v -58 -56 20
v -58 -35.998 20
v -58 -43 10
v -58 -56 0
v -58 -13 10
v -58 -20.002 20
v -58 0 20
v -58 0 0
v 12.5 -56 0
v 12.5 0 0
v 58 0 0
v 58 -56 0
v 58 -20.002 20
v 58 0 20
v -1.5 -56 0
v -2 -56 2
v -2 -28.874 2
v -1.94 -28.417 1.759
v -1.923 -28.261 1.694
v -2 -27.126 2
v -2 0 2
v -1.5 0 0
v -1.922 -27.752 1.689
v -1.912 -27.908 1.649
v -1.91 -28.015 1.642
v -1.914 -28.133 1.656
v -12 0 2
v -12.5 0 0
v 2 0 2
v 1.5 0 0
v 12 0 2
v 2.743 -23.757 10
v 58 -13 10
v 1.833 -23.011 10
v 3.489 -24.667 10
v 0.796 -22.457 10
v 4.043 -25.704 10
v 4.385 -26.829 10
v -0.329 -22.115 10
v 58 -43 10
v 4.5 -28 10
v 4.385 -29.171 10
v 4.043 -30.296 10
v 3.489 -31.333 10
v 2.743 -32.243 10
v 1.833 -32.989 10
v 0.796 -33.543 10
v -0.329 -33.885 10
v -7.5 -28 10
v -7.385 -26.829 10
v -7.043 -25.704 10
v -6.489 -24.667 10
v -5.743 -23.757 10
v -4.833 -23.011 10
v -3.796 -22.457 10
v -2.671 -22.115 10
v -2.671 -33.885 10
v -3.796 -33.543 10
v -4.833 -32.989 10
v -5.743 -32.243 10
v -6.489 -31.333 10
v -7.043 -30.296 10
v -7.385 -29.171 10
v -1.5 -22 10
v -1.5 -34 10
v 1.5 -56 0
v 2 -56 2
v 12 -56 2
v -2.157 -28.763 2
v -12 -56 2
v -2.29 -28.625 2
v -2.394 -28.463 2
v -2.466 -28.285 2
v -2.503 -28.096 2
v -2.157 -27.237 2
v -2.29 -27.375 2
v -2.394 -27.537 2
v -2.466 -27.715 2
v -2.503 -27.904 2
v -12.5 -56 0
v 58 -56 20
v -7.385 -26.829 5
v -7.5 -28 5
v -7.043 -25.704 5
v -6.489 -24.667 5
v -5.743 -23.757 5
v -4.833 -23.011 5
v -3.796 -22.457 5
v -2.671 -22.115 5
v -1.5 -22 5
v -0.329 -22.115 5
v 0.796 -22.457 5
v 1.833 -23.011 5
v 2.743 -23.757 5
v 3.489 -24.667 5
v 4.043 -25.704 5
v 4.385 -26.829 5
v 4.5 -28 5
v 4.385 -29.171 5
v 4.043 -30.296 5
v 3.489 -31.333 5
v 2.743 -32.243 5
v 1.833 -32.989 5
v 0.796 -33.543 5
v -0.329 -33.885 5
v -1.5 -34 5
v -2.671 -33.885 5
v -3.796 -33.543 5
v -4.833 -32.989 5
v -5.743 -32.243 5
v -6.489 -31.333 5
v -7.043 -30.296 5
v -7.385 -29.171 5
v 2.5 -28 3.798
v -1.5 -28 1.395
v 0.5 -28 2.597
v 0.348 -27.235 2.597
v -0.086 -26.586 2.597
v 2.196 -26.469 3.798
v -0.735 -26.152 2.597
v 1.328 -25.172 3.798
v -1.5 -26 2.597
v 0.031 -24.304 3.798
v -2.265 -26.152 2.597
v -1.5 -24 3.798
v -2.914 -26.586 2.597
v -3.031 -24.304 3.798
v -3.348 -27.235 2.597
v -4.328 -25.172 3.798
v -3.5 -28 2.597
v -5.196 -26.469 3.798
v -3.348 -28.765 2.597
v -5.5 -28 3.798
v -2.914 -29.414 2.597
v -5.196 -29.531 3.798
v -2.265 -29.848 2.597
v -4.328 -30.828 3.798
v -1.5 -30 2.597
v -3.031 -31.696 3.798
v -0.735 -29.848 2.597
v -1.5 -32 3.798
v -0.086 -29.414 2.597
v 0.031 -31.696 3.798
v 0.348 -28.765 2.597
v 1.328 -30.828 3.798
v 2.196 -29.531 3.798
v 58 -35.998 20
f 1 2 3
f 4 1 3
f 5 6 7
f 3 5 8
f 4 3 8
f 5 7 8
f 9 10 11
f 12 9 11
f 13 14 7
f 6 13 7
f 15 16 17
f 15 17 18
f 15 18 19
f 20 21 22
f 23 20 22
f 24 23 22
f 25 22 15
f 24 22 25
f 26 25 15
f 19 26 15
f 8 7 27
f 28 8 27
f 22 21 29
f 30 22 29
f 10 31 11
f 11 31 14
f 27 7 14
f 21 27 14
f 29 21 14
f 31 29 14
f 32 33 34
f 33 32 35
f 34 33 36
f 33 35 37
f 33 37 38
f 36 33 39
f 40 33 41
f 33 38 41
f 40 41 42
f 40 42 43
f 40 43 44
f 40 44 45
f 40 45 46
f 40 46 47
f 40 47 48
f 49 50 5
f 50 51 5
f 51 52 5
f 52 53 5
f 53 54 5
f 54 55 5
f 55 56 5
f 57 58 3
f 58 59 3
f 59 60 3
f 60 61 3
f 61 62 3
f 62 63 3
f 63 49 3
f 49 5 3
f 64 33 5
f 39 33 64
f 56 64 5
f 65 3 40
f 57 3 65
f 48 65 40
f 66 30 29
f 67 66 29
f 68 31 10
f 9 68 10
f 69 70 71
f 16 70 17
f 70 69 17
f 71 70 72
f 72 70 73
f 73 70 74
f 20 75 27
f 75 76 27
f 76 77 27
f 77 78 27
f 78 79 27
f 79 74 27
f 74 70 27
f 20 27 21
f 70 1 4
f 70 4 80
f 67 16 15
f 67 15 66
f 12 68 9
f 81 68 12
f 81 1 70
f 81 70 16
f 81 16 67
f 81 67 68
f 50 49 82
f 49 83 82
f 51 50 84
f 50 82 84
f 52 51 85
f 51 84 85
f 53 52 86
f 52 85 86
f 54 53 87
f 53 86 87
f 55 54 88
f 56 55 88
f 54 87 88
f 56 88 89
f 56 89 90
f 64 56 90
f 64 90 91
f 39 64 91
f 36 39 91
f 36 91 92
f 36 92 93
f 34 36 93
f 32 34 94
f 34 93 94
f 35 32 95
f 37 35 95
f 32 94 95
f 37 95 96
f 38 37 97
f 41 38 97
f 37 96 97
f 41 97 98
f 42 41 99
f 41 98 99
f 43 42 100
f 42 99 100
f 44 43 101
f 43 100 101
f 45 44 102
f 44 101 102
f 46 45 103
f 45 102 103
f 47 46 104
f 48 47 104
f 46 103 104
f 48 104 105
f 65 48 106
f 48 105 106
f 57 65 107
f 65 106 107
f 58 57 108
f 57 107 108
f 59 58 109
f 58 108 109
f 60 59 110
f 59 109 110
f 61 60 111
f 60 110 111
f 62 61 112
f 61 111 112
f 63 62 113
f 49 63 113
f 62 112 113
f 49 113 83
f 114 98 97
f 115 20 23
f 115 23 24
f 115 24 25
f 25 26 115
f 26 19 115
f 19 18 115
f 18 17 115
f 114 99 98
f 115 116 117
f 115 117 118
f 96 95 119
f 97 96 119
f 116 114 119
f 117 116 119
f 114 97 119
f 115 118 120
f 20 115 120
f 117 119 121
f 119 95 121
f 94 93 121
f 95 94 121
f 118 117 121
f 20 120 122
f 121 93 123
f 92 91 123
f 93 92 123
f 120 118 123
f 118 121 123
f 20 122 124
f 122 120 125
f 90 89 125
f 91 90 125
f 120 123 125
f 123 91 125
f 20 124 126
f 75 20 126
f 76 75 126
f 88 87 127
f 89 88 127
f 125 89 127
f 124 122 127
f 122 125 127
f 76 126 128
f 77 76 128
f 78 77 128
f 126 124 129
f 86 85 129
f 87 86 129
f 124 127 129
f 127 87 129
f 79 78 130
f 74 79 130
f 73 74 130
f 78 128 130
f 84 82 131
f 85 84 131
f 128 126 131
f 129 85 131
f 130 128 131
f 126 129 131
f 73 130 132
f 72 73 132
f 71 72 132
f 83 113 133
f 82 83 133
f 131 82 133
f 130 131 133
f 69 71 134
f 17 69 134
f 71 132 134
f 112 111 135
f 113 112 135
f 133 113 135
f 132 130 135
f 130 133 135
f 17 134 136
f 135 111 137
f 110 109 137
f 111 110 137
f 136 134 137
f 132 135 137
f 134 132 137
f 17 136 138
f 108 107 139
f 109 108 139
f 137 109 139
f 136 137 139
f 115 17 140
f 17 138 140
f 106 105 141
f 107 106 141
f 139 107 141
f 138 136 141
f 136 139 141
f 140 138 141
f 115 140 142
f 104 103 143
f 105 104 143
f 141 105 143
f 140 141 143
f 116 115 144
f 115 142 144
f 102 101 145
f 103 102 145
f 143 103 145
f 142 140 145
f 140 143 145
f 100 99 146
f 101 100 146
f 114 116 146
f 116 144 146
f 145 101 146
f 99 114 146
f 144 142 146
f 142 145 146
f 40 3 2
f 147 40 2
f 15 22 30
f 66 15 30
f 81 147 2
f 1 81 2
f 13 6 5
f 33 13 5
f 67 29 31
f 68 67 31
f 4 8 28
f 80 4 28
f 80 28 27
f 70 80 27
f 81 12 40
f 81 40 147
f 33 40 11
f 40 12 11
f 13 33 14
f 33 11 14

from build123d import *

# Parameters (mm, degrees)
F1_DEPTH = 56
F3_DEPTH = 116
F5_D     = 12
F5_DEPTH = 5
F5_TIP   = 3.6051637142


# Not quite as in the source:
# - a feature names something its author has since deleted; it is built from what else it names


with BuildPart() as f1:
    # F0 (on Front) → F1 (new body)
    with BuildSketch(Plane.XZ):
        Polygon((1.5, 0), (2, 2), (12, 2), (12.5, 0), (58, 0), (58, 20), (-58, 20), (-58, 0), (-12.5, 0), (-12, 2), (-2, 2), (-1.5, 0), (0, 0), align=None)
    extrude(amount=F1_DEPTH)

    # F2 (on face) → F3 (cut, through all)
    with BuildSketch(Plane(origin=(-58, 0, 0), x_dir=(0, -1, 0), z_dir=(-1, 0, 0))):
        Polygon((28, 20), (20.0020753821, 20), (13, 10), (28, 10), align=None)
        Polygon((35.9979246179, 20), (28, 20), (28, 10), (43, 10), align=None)
    extrude(amount=-F3_DEPTH, mode=Mode.SUBTRACT)

    # F5
    with Locations(Plane.XY.offset(10)):
        with Locations((-1.5, -28)):
            Hole(F5_D / 2, depth=F5_DEPTH)
            with Locations((0, 0, -(F5_DEPTH + F5_TIP / 2))):  # 118° drill point
                Cone(0, F5_D / 2, F5_TIP, mode=Mode.SUBTRACT)


solid = f1.part
